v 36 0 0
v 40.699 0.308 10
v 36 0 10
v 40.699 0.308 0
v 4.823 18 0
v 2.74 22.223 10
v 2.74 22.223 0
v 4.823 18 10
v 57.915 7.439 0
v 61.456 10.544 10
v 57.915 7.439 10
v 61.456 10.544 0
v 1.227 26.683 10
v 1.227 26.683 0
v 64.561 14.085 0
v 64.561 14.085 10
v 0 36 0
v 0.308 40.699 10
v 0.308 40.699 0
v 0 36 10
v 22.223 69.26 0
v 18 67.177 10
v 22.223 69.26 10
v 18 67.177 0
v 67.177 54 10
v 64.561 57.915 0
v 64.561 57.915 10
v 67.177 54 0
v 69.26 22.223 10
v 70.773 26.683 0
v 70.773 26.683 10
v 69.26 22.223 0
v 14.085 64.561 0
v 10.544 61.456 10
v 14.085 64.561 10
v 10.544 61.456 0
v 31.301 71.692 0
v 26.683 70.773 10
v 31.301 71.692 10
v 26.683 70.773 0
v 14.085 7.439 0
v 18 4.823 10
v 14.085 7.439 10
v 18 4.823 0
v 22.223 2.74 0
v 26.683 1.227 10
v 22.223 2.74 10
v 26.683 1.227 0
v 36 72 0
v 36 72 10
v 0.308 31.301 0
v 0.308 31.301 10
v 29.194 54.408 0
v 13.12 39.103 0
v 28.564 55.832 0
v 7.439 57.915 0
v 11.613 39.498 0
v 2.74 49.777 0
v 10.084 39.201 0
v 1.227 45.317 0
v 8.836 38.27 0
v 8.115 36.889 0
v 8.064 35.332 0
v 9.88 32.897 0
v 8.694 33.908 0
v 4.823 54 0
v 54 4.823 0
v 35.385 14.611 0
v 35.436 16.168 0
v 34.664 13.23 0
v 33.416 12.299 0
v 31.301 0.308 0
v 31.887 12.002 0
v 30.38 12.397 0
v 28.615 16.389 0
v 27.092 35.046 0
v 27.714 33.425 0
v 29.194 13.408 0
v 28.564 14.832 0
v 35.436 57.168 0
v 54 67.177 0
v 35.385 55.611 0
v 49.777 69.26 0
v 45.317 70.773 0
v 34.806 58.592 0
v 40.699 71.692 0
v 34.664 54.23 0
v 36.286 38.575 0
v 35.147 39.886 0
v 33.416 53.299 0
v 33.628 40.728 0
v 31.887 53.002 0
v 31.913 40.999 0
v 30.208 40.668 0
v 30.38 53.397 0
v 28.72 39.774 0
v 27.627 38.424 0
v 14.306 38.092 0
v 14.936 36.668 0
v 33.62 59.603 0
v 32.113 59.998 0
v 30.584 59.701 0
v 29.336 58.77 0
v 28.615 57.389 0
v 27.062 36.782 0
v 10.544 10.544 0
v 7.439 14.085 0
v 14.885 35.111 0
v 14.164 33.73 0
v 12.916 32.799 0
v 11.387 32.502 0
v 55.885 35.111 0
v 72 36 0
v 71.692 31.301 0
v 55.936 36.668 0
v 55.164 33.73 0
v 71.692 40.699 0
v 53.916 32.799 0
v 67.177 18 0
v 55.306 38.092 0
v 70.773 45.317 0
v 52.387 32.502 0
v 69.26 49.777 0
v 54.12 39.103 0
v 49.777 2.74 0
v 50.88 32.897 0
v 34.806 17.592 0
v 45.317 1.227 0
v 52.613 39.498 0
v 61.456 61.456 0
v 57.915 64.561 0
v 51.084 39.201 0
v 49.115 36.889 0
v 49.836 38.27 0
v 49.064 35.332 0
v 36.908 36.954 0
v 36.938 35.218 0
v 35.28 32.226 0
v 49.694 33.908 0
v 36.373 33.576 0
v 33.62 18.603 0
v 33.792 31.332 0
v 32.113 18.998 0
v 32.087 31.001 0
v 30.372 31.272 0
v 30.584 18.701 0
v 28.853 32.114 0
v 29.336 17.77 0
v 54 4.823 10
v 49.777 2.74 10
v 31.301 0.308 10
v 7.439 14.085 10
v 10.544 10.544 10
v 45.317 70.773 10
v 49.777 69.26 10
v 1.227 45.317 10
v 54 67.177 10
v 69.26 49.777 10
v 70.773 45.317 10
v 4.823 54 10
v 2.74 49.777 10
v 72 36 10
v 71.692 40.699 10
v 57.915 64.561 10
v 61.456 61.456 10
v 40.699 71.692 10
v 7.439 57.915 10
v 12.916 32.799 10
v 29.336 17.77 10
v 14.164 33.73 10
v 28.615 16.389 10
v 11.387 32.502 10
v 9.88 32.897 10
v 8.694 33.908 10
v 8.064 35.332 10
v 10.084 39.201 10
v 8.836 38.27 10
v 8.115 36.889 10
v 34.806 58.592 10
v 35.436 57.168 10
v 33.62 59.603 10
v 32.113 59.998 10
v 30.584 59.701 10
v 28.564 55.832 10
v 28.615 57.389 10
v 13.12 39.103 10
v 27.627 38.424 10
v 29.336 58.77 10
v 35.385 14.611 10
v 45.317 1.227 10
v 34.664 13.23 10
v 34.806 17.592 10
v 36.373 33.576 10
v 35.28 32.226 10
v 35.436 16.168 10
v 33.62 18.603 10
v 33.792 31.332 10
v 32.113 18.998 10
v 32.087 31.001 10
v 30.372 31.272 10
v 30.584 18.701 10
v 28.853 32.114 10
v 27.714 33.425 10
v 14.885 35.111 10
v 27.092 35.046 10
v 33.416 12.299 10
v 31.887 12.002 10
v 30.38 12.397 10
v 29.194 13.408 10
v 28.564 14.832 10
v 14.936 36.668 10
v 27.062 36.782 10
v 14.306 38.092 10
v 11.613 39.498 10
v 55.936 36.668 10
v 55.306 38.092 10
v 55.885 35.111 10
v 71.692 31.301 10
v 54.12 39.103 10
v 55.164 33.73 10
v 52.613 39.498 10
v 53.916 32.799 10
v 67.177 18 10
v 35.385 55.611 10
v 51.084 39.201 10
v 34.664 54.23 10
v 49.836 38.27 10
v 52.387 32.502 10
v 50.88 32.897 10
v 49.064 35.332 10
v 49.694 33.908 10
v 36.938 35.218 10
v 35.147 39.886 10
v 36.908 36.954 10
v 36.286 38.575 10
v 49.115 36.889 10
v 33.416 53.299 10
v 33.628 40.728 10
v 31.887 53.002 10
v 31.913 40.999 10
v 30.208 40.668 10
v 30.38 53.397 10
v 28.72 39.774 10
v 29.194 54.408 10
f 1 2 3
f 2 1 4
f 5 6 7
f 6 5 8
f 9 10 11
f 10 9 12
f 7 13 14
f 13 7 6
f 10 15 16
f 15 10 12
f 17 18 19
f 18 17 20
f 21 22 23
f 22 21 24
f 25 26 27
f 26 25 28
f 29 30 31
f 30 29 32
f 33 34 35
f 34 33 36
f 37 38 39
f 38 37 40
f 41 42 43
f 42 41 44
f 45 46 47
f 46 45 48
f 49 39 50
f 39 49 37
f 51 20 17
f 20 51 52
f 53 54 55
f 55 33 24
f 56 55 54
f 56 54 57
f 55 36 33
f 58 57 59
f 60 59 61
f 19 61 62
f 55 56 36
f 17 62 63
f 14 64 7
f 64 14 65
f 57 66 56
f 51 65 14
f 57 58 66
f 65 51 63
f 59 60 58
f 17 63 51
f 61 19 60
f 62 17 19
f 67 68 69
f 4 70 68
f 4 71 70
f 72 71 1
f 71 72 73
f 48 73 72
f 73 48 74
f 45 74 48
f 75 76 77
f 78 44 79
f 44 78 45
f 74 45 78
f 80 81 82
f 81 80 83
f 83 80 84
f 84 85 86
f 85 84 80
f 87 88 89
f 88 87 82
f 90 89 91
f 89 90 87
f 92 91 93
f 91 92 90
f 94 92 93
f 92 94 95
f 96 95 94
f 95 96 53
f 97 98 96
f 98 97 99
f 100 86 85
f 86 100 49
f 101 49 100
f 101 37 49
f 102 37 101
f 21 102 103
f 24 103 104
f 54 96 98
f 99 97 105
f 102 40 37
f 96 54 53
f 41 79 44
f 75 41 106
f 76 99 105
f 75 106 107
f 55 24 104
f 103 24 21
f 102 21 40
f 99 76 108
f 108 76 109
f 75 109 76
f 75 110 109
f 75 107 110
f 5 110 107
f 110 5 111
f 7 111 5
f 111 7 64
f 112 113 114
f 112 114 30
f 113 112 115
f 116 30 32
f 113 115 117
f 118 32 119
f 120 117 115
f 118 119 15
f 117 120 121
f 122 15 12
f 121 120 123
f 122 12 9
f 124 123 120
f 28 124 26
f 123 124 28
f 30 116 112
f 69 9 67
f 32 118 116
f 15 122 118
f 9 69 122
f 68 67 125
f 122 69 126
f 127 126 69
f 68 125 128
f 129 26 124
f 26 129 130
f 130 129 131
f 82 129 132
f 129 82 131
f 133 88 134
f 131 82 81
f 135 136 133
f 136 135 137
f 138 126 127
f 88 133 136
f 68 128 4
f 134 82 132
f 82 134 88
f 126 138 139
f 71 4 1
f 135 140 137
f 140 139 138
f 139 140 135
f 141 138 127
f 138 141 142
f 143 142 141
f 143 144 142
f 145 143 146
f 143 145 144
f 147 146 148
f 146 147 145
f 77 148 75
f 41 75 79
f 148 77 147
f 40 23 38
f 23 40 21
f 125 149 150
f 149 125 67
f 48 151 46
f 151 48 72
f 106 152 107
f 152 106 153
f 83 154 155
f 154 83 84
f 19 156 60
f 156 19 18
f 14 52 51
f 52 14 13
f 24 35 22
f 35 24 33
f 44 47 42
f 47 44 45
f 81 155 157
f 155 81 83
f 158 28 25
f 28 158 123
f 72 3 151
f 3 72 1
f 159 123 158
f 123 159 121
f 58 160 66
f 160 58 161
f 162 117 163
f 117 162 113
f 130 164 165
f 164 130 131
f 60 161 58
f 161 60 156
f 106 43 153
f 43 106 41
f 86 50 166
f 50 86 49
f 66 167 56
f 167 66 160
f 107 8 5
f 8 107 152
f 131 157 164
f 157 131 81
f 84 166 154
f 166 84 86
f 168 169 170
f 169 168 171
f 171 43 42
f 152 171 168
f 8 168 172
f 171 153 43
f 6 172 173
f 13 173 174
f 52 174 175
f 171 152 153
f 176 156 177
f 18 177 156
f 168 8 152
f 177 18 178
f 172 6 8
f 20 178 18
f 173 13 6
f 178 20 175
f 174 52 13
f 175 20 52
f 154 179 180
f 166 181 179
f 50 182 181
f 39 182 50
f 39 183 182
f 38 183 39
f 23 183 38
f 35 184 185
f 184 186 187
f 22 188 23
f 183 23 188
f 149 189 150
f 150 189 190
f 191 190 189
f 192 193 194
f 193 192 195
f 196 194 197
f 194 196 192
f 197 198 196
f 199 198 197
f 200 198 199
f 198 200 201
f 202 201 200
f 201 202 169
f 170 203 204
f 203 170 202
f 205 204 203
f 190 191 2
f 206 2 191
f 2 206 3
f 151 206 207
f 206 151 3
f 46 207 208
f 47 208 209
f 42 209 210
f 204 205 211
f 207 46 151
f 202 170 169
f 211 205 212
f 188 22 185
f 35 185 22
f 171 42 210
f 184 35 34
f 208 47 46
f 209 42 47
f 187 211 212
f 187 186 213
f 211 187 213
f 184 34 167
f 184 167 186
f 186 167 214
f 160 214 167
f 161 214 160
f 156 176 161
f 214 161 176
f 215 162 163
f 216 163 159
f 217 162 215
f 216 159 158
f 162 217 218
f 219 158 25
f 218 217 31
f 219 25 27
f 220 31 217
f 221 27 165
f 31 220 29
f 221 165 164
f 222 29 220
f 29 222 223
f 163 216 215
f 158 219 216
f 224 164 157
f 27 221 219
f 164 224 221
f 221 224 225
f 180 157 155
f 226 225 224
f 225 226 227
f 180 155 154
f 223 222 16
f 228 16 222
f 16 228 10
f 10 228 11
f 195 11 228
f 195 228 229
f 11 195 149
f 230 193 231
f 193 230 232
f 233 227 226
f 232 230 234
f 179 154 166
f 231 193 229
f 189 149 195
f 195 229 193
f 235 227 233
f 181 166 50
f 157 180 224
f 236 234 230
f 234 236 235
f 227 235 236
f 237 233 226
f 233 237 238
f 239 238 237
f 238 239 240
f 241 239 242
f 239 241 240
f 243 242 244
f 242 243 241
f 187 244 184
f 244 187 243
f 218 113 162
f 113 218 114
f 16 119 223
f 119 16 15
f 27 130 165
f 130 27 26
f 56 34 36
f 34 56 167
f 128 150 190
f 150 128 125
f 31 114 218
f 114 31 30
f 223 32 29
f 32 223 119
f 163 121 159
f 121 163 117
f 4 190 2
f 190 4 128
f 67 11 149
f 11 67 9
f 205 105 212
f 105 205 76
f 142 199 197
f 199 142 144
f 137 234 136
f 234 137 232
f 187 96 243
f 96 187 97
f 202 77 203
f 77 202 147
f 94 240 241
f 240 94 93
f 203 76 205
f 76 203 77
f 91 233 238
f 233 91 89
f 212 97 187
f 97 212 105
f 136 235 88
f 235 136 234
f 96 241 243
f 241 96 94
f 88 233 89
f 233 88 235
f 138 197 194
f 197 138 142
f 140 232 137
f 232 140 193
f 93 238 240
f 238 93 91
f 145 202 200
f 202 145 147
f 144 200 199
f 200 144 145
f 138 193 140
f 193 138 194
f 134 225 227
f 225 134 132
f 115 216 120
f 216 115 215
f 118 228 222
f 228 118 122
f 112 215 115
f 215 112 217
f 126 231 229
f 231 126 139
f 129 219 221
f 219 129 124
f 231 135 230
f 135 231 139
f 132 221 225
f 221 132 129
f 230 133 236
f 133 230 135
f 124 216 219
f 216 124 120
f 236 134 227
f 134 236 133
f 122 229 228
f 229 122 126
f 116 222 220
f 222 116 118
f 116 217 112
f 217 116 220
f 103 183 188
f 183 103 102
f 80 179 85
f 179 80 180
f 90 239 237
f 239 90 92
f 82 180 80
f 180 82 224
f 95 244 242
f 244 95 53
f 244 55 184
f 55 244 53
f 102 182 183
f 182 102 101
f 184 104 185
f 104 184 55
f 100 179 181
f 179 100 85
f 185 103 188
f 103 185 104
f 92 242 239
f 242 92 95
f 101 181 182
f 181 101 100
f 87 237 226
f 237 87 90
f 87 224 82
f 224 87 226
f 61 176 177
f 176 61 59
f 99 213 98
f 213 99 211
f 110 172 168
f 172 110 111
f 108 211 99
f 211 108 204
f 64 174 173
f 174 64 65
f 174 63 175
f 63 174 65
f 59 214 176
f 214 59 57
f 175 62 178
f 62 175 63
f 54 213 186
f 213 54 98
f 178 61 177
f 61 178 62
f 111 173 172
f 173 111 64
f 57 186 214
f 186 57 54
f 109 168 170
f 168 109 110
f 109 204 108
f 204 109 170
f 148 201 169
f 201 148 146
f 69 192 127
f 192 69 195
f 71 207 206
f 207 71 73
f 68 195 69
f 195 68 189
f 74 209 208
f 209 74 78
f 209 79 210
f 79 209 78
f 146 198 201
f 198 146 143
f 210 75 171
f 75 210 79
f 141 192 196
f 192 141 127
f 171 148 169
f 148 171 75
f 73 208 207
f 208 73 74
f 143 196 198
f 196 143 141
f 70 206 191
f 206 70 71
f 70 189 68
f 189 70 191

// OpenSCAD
$fn = 32;

// ----------------------------------------------------------------------
// Cam plate: eccentric cam, base R36
// ----------------------------------------------------------------------

// --- parameters (mm) ---
base_r = 36;              // base circle radius
lobe_h = 8;               // cam lobe rise
bore_r = 5;               // shaft bore radius
plate_t = 10;             // plate thickness, Z (extrusion height)
ecc = 4;                  // disc eccentricity
ring_r = 20.5;            // lightening ring radius
bolt_r = 3.5;             // lightening hole radius

profile = [[72, 36], [71.692, 40.699], [70.773, 45.317], [69.26, 49.777], [67.177, 54], [64.561, 57.915], [61.456, 61.456], [57.915, 64.561], [54, 67.177], [49.777, 69.26], [45.317, 70.773], [40.699, 71.692], [36, 72], [31.301, 71.692], [26.683, 70.773], [22.223, 69.26], [18, 67.177], [14.085, 64.561], [10.544, 61.456], [7.439, 57.915], [4.823, 54], [2.74, 49.777], [1.227, 45.317], [0.308, 40.699], [0, 36], [0.308, 31.301], [1.227, 26.683], [2.74, 22.223], [4.823, 18], [7.439, 14.085], [10.544, 10.544], [14.085, 7.439], [18, 4.823], [22.223, 2.74], [26.683, 1.227], [31.301, 0.308], [36, 0], [40.699, 0.308], [45.317, 1.227], [49.777, 2.74], [54, 4.823], [57.915, 7.439], [61.456, 10.544], [64.561, 14.085], [67.177, 18], [69.26, 22.223], [70.773, 26.683], [71.692, 31.301]];  // primary outline, 48 points, counter clockwise
void_1 = [[36.908, 36.954], [36.286, 38.575], [35.147, 39.886], [33.628, 40.728], [31.913, 40.999], [30.208, 40.668], [28.72, 39.774], [27.627, 38.424], [27.062, 36.782], [27.092, 35.046], [27.714, 33.425], [28.853, 32.114], [30.372, 31.272], [32.087, 31.001], [33.792, 31.332], [35.28, 32.226], [36.373, 33.576], [36.938, 35.218]];  // shaft bore, 18 points
void_2 = [[55.936, 36.668], [55.306, 38.092], [54.12, 39.103], [52.613, 39.498], [51.084, 39.201], [49.836, 38.27], [49.115, 36.889], [49.064, 35.332], [49.694, 33.908], [50.88, 32.897], [52.387, 32.502], [53.916, 32.799], [55.164, 33.73], [55.885, 35.111]];  // lightening hole 1, 14 points
void_3 = [[35.436, 57.168], [34.806, 58.592], [33.62, 59.603], [32.113, 59.998], [30.584, 59.701], [29.336, 58.77], [28.615, 57.389], [28.564, 55.832], [29.194, 54.408], [30.38, 53.397], [31.887, 53.002], [33.416, 53.299], [34.664, 54.23], [35.385, 55.611]];  // lightening hole 2, 14 points
void_4 = [[14.936, 36.668], [14.306, 38.092], [13.12, 39.103], [11.613, 39.498], [10.084, 39.201], [8.836, 38.27], [8.115, 36.889], [8.064, 35.332], [8.694, 33.908], [9.88, 32.897], [11.387, 32.502], [12.916, 32.799], [14.164, 33.73], [14.885, 35.111]];  // lightening hole 3, 14 points
void_5 = [[35.436, 16.168], [34.806, 17.592], [33.62, 18.603], [32.113, 18.998], [30.584, 18.701], [29.336, 17.77], [28.615, 16.389], [28.564, 14.832], [29.194, 13.408], [30.38, 12.397], [31.887, 12.002], [33.416, 12.299], [34.664, 13.23], [35.385, 14.611]];  // lightening hole 4, 14 points

// --- the one profile operation ---
difference() {
  linear_extrude(height = plate_t) polygon(points = profile);
  translate([0, 0, -1])
    linear_extrude(height = plate_t + 2) polygon(points = void_1);
  translate([0, 0, -1])
    linear_extrude(height = plate_t + 2) polygon(points = void_2);
  translate([0, 0, -1])
    linear_extrude(height = plate_t + 2) polygon(points = void_3);
  translate([0, 0, -1])
    linear_extrude(height = plate_t + 2) polygon(points = void_4);
  translate([0, 0, -1])
    linear_extrude(height = plate_t + 2) polygon(points = void_5);
}
